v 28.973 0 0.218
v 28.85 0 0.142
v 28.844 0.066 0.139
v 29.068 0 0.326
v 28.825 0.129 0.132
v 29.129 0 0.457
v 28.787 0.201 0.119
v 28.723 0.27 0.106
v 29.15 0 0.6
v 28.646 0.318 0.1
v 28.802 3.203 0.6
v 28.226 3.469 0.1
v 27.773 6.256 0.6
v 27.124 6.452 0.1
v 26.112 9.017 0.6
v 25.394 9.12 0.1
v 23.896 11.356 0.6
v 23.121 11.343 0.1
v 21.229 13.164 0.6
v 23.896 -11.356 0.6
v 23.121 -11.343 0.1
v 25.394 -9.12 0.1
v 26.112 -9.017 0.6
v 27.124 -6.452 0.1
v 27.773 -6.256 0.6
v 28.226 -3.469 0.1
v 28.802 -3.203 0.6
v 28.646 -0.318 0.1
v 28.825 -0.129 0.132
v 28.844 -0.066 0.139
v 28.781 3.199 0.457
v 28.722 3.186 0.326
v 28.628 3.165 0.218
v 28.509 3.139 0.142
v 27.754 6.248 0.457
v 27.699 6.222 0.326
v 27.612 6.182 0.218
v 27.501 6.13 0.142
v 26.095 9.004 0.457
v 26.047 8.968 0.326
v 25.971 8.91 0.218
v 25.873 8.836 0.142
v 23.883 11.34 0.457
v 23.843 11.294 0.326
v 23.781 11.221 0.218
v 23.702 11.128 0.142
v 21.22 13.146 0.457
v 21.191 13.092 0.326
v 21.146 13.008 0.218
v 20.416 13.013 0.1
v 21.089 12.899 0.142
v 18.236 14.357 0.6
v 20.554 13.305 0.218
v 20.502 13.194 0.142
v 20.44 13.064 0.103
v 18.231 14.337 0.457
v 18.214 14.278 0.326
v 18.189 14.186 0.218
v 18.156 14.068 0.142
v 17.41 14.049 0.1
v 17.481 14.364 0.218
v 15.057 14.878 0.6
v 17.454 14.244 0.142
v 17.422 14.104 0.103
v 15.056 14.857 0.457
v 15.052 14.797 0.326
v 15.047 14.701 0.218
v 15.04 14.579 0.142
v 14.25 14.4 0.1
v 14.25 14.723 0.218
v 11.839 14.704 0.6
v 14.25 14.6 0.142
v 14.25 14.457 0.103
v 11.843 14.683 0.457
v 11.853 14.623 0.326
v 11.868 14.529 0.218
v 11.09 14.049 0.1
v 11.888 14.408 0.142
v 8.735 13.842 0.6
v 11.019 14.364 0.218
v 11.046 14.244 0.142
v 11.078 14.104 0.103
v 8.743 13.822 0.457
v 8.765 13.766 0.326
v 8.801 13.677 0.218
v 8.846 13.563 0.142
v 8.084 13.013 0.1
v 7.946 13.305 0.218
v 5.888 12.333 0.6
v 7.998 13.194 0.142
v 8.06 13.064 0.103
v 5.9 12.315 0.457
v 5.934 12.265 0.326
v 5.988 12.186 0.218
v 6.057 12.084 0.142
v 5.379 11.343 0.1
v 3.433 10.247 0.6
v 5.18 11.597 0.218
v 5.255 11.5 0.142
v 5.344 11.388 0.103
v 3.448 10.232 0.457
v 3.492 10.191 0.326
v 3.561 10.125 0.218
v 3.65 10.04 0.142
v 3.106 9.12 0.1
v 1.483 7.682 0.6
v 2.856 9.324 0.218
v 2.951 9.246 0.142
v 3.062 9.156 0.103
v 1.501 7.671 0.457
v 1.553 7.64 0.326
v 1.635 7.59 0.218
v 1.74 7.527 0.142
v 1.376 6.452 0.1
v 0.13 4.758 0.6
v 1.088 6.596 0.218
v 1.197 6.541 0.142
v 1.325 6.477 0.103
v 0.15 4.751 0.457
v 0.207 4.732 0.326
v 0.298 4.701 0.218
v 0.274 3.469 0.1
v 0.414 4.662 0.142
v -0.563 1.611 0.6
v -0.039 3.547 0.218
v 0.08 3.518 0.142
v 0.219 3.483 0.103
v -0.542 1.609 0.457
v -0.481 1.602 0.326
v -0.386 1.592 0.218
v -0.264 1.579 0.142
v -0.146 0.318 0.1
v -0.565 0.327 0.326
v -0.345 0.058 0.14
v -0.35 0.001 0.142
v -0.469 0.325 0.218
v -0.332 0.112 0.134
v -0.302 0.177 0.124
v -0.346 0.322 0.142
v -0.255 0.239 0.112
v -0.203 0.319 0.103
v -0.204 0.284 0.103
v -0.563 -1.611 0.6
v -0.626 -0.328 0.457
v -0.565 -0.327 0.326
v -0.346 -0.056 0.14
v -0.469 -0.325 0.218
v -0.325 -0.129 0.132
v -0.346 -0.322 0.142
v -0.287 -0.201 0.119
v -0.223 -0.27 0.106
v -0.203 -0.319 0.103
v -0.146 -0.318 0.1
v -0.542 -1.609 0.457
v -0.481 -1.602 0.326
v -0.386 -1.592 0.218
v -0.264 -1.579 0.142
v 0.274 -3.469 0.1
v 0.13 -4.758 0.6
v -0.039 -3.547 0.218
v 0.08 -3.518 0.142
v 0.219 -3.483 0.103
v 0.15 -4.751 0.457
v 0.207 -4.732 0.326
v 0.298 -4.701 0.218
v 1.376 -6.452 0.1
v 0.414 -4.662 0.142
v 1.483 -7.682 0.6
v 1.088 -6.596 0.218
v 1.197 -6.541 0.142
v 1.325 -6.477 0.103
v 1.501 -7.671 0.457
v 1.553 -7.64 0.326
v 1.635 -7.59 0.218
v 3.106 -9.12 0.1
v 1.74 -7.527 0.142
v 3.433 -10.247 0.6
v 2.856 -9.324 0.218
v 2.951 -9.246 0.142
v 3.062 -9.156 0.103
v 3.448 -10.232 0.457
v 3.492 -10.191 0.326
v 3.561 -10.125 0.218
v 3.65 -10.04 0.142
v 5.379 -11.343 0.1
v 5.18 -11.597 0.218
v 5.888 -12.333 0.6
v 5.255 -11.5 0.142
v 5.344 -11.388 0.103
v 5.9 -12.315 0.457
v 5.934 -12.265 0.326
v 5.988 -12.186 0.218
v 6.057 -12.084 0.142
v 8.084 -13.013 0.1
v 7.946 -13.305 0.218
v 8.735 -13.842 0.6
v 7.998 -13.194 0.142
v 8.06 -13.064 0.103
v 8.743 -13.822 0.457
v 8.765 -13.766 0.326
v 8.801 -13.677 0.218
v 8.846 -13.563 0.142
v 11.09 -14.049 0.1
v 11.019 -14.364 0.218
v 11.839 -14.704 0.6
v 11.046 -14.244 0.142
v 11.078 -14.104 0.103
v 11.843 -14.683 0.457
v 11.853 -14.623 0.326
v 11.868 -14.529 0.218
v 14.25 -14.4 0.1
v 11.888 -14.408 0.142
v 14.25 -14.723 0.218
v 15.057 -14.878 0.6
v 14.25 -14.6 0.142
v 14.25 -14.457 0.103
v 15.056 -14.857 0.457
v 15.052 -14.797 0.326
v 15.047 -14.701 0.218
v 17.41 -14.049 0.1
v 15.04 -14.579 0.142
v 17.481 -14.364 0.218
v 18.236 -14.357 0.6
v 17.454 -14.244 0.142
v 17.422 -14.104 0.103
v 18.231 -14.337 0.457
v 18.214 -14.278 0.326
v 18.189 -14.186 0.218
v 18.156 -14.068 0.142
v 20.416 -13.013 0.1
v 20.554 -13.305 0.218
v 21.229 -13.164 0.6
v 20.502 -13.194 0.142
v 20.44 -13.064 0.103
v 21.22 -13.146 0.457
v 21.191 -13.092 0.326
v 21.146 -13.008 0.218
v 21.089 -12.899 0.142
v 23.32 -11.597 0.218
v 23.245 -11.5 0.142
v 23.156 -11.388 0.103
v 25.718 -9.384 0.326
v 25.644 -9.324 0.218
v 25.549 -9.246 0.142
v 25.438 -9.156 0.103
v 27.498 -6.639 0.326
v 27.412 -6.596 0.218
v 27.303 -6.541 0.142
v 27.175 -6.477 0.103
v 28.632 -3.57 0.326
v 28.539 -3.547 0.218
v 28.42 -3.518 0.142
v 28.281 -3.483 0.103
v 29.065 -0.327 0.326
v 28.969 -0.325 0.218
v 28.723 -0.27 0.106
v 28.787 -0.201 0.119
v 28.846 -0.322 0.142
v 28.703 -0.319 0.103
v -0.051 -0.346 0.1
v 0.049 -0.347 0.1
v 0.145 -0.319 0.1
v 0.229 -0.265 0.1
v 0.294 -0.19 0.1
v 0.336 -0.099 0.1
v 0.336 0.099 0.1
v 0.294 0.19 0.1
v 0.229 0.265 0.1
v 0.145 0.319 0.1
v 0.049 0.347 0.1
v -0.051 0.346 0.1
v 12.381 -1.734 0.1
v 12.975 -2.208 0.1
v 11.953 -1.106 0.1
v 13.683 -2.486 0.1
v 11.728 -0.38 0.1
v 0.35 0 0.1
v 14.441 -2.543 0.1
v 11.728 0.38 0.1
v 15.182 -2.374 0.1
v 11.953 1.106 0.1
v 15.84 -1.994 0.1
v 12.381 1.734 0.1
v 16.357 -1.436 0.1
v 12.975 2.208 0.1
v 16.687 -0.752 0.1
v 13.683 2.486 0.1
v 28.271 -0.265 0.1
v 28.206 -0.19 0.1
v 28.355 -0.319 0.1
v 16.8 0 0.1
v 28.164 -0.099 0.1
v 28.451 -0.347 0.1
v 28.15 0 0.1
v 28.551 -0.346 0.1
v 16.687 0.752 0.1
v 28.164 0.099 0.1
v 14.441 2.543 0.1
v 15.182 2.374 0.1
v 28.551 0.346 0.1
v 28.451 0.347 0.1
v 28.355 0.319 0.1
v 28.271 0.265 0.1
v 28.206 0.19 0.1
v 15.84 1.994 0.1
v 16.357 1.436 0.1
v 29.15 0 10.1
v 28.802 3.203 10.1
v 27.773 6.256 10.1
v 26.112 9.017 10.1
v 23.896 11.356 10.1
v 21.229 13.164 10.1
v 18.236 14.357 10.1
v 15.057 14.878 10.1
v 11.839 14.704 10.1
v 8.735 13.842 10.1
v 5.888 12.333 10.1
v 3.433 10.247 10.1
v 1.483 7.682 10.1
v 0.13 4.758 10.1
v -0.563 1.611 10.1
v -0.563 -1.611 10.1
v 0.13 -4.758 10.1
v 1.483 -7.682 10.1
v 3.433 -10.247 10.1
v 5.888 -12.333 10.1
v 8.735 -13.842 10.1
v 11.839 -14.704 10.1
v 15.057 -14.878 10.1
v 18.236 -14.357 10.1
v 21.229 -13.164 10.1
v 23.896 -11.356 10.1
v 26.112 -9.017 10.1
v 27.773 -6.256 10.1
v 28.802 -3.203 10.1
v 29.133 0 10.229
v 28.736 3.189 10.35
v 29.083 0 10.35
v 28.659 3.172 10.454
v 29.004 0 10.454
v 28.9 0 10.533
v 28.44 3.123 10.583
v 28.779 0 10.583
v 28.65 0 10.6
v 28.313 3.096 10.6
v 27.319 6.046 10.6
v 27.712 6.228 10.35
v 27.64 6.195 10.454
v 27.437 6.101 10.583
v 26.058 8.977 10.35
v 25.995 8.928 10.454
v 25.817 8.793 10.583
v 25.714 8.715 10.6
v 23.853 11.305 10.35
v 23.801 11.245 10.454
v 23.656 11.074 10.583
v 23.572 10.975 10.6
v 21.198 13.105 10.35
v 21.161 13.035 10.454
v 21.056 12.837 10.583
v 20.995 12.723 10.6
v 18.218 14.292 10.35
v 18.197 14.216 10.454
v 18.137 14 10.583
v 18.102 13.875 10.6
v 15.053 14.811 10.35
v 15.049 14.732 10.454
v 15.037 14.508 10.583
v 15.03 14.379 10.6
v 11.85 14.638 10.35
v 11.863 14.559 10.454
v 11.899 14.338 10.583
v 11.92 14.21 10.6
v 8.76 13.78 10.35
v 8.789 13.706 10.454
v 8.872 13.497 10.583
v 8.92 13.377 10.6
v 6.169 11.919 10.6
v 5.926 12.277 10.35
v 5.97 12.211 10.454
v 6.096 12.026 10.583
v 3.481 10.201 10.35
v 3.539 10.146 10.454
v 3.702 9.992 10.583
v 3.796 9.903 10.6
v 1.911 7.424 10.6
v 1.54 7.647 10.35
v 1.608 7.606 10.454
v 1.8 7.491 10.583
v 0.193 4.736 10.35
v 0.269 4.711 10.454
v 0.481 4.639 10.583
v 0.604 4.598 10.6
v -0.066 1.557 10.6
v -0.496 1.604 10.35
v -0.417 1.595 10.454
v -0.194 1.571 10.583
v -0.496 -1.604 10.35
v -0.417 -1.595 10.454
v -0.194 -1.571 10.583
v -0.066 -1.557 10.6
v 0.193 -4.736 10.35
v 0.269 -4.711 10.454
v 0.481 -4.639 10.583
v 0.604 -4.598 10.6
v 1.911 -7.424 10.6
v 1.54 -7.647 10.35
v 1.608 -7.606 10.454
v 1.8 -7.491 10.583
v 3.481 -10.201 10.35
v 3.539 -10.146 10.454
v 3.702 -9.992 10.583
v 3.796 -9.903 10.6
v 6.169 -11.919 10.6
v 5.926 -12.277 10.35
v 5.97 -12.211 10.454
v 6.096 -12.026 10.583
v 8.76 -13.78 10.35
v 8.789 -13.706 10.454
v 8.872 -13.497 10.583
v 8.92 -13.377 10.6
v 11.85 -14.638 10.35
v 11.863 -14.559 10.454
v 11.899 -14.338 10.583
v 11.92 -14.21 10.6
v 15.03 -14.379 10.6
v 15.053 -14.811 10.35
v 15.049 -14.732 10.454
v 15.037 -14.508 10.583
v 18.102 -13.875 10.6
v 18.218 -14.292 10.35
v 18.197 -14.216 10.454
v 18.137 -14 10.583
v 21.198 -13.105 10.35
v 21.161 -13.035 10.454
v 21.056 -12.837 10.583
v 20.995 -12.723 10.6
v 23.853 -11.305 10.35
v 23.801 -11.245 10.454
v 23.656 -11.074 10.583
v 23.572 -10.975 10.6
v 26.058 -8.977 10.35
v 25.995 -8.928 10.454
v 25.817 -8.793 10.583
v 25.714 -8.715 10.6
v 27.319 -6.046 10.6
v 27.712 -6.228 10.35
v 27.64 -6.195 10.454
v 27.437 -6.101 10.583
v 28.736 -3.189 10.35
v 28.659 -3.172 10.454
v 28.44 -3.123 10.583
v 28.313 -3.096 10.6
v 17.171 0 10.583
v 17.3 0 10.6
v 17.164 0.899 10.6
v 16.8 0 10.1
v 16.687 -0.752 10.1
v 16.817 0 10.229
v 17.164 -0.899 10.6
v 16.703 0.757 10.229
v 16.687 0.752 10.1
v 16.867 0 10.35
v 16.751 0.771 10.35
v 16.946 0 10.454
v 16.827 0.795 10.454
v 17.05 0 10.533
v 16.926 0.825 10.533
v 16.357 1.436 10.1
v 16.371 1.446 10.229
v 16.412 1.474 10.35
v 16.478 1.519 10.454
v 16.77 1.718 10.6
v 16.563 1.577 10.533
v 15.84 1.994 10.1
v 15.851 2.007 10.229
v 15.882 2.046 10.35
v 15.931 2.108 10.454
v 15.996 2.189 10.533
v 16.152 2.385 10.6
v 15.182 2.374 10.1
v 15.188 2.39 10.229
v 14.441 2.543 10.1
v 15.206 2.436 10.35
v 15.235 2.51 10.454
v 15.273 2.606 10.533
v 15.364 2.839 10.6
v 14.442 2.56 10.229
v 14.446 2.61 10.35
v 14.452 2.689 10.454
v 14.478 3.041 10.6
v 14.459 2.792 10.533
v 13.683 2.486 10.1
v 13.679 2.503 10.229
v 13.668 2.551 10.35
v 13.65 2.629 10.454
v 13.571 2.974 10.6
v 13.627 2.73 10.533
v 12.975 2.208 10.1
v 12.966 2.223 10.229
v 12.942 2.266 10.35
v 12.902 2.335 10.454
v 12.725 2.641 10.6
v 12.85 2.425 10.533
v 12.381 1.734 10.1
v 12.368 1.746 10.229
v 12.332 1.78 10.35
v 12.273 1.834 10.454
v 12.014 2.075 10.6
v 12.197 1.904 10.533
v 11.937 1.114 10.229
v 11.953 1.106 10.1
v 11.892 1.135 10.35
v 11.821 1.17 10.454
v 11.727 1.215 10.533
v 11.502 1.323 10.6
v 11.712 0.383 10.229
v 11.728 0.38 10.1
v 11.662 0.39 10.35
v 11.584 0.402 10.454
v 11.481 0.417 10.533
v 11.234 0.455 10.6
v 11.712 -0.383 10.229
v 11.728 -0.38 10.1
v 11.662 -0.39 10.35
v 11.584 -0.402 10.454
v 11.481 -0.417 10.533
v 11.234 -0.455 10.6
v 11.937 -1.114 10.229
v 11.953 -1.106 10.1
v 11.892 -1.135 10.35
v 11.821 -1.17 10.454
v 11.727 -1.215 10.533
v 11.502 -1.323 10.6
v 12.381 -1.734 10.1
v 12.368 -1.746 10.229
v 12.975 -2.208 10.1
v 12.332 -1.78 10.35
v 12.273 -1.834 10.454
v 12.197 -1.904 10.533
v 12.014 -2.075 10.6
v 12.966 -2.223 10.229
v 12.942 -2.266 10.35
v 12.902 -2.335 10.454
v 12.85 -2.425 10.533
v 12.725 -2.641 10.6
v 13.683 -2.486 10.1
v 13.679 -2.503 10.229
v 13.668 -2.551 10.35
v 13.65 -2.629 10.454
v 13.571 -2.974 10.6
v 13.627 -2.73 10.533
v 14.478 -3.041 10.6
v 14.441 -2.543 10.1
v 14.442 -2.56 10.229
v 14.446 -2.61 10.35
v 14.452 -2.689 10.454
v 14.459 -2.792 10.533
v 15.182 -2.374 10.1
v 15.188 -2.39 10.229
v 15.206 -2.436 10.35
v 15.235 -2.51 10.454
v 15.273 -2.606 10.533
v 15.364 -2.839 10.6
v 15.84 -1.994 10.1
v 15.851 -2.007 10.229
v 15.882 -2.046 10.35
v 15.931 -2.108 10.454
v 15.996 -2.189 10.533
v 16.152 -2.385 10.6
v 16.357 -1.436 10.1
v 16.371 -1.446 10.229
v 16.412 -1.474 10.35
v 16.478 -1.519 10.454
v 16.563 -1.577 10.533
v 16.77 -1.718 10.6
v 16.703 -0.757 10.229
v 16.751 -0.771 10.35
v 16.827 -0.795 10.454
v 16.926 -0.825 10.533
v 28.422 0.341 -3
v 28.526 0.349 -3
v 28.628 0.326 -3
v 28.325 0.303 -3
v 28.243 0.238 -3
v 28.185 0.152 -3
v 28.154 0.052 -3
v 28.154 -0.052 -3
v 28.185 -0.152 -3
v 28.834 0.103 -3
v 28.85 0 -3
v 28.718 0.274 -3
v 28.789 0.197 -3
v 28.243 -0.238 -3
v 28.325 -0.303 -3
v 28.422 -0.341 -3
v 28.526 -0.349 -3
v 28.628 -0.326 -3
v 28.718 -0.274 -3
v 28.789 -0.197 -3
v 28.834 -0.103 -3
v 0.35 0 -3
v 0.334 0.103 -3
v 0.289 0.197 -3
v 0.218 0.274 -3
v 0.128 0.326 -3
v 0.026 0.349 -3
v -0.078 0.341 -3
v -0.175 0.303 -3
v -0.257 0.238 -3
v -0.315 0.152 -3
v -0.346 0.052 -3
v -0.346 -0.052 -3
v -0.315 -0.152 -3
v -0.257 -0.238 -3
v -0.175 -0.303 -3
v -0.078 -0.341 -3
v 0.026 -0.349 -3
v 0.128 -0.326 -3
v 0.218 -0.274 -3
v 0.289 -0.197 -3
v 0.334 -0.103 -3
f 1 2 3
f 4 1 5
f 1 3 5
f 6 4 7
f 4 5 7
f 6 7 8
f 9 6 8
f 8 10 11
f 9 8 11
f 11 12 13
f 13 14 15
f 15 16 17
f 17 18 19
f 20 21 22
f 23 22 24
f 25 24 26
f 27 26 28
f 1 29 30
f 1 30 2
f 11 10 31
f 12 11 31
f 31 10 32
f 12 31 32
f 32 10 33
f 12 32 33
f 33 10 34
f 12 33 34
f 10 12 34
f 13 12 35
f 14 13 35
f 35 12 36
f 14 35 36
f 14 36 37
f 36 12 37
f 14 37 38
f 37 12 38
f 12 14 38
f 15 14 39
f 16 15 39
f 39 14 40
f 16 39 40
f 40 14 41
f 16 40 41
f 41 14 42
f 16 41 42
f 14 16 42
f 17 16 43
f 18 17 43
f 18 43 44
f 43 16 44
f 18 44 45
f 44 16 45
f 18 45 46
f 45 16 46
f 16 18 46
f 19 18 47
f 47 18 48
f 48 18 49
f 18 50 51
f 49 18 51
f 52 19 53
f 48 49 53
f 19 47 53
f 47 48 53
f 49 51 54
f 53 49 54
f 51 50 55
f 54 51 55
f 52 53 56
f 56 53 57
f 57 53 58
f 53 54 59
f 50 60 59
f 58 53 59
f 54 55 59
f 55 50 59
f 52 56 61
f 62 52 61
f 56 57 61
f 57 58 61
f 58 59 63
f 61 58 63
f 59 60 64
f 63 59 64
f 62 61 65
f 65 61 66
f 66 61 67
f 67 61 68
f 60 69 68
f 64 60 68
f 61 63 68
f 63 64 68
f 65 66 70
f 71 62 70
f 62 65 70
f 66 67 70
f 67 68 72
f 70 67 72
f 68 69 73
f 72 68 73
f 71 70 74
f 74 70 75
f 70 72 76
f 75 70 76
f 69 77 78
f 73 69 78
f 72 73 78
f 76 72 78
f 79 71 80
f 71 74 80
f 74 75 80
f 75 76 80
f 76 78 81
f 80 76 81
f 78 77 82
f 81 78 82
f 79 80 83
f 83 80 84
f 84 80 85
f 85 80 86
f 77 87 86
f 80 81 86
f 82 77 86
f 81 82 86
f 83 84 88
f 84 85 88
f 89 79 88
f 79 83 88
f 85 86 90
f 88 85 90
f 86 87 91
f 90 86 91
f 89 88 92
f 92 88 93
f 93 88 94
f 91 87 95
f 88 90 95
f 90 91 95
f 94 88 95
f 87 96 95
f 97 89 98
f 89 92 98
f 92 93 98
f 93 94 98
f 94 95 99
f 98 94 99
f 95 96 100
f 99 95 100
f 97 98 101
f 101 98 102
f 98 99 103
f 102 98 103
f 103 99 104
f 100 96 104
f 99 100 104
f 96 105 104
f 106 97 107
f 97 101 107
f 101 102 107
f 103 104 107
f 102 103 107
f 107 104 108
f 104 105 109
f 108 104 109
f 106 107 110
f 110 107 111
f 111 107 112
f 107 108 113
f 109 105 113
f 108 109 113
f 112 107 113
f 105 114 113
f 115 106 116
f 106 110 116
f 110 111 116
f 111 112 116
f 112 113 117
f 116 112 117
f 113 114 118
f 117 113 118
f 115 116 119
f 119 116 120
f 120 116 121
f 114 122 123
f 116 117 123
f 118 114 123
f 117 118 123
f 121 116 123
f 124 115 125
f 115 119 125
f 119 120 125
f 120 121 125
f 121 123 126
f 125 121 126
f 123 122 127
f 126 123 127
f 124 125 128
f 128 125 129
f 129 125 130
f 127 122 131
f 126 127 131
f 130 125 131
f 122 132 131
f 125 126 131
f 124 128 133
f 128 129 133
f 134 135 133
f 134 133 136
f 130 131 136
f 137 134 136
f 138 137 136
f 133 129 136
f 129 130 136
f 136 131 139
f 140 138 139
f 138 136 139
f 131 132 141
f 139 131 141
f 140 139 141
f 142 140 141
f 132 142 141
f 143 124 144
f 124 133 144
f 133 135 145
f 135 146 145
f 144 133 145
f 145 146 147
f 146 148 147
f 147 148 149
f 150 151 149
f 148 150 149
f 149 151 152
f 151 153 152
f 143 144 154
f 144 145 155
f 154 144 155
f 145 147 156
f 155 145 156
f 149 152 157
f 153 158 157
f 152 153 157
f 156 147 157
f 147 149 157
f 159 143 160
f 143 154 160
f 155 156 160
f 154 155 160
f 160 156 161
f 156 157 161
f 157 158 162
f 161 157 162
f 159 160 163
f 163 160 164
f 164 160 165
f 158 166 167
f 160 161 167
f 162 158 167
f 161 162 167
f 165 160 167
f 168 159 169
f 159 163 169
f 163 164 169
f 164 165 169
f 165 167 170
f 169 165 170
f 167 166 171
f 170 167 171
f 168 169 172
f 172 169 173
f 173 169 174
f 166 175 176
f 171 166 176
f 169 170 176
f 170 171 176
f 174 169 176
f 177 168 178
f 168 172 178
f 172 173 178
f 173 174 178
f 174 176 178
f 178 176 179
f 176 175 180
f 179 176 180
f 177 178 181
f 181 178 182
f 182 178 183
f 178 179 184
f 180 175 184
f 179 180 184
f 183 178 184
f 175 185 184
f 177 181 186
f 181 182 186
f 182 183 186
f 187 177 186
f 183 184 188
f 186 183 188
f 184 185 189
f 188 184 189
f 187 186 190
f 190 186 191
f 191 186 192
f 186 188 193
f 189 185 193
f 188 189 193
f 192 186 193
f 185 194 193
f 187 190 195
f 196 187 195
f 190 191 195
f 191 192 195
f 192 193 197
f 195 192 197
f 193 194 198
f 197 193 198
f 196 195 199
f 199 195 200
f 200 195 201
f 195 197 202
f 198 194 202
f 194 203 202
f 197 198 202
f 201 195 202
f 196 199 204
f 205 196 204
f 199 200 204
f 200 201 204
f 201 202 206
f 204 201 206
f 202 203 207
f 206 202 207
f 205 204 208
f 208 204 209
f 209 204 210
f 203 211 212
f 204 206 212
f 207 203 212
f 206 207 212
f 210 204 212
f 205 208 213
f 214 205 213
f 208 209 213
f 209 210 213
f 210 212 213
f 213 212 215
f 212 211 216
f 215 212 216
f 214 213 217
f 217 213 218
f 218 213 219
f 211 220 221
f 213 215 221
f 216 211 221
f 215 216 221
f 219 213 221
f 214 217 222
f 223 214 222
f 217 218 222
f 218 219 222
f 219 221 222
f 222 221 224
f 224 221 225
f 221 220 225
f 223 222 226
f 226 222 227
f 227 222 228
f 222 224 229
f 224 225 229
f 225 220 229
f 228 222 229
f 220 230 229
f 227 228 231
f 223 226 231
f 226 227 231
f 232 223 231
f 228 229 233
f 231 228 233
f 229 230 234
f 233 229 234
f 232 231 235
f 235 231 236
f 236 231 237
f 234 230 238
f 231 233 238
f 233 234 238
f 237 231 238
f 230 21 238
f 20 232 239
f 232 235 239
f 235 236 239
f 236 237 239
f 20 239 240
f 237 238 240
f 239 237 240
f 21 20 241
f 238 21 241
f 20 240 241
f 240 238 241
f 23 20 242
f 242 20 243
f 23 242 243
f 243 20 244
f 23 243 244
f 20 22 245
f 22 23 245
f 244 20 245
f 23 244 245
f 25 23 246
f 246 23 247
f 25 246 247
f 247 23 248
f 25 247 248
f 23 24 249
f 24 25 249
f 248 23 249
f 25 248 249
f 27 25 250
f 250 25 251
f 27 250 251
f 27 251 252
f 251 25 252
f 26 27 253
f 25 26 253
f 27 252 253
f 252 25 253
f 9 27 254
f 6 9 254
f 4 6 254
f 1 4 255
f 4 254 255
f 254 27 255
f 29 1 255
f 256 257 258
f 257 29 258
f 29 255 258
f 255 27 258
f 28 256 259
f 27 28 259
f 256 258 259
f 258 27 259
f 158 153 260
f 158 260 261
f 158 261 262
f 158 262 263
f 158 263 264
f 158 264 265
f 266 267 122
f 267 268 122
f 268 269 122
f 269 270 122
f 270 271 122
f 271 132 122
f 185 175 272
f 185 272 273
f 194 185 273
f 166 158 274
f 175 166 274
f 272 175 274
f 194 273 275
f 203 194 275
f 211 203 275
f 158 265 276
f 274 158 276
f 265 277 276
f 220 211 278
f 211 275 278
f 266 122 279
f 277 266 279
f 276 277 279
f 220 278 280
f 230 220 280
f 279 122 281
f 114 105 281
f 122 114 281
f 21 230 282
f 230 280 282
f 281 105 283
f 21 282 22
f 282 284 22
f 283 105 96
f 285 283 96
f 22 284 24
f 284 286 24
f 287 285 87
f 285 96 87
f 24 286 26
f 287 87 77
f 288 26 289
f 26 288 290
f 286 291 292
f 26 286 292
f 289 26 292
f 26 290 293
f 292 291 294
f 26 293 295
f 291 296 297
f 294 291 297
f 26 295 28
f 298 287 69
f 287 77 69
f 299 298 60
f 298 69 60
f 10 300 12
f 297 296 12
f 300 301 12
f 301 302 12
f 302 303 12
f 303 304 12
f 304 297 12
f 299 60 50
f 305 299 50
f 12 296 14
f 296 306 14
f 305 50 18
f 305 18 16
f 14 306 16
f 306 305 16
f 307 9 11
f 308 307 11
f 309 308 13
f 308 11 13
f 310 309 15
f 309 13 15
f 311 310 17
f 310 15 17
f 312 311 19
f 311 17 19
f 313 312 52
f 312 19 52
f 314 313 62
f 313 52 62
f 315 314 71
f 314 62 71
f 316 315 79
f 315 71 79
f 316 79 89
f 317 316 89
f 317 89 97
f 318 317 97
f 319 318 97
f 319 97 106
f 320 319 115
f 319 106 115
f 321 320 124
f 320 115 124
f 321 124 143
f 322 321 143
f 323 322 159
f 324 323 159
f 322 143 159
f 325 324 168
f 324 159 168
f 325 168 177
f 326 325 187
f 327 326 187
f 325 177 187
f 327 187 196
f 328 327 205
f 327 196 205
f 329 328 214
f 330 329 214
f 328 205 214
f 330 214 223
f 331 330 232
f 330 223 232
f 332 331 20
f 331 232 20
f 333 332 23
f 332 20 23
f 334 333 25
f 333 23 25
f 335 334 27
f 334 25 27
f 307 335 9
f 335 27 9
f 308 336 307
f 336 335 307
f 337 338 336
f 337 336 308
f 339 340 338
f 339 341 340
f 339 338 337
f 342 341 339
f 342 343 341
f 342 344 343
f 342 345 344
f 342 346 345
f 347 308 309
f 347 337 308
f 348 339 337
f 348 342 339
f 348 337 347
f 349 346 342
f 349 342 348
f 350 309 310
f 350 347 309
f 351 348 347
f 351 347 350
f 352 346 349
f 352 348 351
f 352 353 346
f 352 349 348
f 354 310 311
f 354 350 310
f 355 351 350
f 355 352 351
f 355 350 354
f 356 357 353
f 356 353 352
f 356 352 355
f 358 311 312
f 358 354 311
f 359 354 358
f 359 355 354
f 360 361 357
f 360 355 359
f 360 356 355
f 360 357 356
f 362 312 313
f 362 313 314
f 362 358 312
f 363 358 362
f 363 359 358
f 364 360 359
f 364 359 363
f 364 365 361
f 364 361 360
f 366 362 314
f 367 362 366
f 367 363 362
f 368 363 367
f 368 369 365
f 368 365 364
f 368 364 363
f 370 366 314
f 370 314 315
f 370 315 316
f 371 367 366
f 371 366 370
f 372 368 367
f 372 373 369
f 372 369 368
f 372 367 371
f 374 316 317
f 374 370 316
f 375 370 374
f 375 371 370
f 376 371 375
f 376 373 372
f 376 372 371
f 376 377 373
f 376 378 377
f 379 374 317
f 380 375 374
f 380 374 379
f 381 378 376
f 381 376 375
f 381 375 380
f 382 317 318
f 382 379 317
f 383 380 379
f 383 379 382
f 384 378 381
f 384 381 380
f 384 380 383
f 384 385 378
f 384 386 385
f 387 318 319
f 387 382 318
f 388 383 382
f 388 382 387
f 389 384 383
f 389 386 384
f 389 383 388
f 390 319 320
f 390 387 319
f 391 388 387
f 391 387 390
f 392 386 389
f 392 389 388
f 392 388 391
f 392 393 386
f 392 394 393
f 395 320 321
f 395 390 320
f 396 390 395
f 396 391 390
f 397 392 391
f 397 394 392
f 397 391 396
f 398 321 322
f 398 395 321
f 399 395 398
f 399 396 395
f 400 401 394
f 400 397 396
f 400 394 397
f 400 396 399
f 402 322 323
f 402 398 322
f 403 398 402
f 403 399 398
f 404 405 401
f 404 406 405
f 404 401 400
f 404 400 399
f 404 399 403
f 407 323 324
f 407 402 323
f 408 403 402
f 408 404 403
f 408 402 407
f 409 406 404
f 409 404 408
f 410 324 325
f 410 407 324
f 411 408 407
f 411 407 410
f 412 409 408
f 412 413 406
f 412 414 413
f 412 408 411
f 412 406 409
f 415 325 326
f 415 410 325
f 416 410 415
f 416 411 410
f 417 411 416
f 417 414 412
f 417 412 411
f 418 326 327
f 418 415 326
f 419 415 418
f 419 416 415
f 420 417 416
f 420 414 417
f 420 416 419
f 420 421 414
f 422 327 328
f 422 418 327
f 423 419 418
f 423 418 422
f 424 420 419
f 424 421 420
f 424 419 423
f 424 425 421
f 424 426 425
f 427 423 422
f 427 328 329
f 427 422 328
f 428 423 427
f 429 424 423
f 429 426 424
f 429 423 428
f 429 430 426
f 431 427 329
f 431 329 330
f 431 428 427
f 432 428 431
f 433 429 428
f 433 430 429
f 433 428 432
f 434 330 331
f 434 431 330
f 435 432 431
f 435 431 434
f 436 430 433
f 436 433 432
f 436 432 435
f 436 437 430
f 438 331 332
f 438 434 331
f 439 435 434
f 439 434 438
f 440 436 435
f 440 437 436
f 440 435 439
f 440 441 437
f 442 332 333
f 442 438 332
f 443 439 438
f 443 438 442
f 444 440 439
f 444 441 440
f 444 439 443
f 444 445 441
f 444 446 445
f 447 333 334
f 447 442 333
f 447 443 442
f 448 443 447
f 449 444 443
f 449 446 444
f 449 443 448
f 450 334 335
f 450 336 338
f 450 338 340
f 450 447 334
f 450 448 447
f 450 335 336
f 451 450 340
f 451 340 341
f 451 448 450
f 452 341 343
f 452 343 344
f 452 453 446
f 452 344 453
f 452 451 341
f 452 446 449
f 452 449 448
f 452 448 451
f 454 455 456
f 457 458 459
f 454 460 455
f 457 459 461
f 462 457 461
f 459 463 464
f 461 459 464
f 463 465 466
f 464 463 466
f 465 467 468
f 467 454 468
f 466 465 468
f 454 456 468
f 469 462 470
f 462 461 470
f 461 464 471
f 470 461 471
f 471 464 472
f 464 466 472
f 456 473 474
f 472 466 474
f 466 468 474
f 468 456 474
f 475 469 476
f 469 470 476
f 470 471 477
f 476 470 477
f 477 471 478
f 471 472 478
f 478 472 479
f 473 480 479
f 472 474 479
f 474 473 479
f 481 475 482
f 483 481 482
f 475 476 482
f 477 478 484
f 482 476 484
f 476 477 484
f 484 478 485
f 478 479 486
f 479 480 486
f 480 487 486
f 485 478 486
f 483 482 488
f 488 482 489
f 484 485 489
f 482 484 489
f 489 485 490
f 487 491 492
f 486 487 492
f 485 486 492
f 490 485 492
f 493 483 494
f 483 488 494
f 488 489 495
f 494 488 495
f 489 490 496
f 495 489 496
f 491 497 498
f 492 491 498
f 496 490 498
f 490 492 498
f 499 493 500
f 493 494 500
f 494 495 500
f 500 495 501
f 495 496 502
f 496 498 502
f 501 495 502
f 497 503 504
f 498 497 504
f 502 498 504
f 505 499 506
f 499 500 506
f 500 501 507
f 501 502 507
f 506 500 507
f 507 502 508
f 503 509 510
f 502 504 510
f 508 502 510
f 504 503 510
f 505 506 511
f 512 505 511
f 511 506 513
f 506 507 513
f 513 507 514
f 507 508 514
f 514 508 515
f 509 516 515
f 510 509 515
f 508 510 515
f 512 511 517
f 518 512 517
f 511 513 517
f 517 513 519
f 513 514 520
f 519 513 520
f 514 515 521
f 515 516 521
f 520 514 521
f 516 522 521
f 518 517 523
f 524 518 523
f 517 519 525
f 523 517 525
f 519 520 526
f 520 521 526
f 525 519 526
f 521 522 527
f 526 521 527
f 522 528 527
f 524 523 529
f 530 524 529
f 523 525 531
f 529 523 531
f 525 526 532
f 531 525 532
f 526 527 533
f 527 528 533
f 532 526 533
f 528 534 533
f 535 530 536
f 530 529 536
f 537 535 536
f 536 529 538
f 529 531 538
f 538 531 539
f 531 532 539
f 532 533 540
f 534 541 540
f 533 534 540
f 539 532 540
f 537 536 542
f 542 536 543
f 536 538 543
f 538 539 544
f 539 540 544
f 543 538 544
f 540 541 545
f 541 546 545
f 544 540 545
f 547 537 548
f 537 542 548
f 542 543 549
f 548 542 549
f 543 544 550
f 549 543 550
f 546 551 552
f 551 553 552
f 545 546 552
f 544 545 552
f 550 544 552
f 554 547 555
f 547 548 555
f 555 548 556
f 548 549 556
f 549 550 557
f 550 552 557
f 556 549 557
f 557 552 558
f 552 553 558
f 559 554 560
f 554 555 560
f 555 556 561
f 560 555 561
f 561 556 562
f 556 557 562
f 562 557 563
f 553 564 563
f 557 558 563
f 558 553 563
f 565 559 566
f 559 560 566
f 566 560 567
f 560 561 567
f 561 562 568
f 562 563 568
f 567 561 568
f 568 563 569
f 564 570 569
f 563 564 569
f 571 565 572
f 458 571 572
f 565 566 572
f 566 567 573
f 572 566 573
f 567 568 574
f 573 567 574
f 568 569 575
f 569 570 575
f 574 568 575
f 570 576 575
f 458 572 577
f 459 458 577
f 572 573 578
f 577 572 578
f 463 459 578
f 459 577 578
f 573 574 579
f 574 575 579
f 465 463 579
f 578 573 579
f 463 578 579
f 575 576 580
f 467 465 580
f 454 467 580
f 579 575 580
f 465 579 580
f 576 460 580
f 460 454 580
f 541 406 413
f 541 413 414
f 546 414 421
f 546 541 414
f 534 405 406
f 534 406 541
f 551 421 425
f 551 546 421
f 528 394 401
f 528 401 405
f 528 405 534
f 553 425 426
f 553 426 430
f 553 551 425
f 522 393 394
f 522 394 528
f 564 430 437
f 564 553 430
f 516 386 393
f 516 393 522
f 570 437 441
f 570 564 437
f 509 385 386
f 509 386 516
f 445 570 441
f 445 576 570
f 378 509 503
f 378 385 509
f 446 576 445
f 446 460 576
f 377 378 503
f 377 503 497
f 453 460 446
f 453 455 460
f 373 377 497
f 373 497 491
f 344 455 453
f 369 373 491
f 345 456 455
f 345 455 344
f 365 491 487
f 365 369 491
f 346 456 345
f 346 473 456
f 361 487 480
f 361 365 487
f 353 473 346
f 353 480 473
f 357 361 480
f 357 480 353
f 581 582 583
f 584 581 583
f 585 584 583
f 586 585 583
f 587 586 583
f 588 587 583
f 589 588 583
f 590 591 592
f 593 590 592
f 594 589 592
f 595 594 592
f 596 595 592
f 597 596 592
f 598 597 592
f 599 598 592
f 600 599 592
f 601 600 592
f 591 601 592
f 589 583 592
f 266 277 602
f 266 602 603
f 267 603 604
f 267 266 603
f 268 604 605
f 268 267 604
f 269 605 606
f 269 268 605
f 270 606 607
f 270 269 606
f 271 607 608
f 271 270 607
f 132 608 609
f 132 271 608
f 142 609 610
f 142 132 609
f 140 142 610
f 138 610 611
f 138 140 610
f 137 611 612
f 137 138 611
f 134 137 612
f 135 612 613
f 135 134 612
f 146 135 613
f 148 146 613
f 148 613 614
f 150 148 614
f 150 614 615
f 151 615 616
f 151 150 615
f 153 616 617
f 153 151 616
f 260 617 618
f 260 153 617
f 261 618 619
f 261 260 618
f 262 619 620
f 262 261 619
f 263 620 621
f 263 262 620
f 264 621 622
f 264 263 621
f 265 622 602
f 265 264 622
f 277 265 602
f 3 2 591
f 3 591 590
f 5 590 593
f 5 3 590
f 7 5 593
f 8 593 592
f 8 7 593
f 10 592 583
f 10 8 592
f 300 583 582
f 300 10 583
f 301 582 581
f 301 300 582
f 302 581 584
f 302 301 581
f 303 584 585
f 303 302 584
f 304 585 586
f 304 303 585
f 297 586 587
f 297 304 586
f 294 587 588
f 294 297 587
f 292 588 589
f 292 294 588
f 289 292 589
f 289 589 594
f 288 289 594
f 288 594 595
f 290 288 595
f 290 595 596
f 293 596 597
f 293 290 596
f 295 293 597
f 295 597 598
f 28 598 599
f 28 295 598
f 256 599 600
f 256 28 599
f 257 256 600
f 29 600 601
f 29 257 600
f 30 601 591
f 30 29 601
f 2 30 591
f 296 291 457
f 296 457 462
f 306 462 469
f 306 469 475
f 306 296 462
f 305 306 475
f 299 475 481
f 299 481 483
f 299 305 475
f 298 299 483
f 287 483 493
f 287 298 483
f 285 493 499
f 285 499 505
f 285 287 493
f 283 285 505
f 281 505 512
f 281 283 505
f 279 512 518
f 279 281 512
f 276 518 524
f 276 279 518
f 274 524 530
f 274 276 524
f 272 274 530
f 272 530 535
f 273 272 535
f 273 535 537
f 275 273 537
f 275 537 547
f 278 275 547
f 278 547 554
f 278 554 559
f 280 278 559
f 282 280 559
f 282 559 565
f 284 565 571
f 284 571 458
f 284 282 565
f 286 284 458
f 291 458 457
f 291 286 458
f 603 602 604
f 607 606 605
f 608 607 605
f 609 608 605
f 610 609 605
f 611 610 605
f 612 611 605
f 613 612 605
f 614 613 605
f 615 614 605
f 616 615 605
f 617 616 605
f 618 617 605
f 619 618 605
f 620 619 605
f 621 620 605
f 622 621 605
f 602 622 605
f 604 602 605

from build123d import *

# Parameters (mm, degrees)
SKETCH_R          = 14.9
SKETCH_R_2        = 2.55
PAD_DEPTH         = 10.5
FILLET_R          = 0.5
SKETCH001_R       = 0.35
PAD001_DEPTH      = 5.25
PAD001_DEPTH_BACK = 3.5


with BuildPart() as fillet_body:
    # Sketch → Pad (new body)
    with BuildSketch(Plane.XY.offset(0.1)):
        with Locations((14.25, 0)):
            Circle(SKETCH_R)
        with Locations((14.25, 0)):
            Circle(SKETCH_R_2, mode=Mode.SUBTRACT)
    extrude(amount=PAD_DEPTH)

    # Fillet
    fillet_edges = [fillet_body.edges().sort_by_distance(p)[0] for p in [
        (11.7, 0, 10.6),
        (-0.65, 0, 10.6),
        (-0.65, 0, 0.1),
    ]]
    fillet(fillet_edges, radius=FILLET_R)


with BuildPart() as pad001_mp_cp:
    # Sketch001 → Pad001 (new body, two sides)
    with BuildSketch(Plane.XY.offset(0.5)) as pad001_sk:
        Circle(SKETCH001_R)
        with Locations((28.5, 0)):
            Circle(SKETCH001_R)
    extrude(amount=PAD001_DEPTH)
    extrude(pad001_sk.sketch, amount=-PAD001_DEPTH_BACK)

    # Pad001_mp_cp: union Fillet body
    add(fillet_body.part)


solid = pad001_mp_cp.part
